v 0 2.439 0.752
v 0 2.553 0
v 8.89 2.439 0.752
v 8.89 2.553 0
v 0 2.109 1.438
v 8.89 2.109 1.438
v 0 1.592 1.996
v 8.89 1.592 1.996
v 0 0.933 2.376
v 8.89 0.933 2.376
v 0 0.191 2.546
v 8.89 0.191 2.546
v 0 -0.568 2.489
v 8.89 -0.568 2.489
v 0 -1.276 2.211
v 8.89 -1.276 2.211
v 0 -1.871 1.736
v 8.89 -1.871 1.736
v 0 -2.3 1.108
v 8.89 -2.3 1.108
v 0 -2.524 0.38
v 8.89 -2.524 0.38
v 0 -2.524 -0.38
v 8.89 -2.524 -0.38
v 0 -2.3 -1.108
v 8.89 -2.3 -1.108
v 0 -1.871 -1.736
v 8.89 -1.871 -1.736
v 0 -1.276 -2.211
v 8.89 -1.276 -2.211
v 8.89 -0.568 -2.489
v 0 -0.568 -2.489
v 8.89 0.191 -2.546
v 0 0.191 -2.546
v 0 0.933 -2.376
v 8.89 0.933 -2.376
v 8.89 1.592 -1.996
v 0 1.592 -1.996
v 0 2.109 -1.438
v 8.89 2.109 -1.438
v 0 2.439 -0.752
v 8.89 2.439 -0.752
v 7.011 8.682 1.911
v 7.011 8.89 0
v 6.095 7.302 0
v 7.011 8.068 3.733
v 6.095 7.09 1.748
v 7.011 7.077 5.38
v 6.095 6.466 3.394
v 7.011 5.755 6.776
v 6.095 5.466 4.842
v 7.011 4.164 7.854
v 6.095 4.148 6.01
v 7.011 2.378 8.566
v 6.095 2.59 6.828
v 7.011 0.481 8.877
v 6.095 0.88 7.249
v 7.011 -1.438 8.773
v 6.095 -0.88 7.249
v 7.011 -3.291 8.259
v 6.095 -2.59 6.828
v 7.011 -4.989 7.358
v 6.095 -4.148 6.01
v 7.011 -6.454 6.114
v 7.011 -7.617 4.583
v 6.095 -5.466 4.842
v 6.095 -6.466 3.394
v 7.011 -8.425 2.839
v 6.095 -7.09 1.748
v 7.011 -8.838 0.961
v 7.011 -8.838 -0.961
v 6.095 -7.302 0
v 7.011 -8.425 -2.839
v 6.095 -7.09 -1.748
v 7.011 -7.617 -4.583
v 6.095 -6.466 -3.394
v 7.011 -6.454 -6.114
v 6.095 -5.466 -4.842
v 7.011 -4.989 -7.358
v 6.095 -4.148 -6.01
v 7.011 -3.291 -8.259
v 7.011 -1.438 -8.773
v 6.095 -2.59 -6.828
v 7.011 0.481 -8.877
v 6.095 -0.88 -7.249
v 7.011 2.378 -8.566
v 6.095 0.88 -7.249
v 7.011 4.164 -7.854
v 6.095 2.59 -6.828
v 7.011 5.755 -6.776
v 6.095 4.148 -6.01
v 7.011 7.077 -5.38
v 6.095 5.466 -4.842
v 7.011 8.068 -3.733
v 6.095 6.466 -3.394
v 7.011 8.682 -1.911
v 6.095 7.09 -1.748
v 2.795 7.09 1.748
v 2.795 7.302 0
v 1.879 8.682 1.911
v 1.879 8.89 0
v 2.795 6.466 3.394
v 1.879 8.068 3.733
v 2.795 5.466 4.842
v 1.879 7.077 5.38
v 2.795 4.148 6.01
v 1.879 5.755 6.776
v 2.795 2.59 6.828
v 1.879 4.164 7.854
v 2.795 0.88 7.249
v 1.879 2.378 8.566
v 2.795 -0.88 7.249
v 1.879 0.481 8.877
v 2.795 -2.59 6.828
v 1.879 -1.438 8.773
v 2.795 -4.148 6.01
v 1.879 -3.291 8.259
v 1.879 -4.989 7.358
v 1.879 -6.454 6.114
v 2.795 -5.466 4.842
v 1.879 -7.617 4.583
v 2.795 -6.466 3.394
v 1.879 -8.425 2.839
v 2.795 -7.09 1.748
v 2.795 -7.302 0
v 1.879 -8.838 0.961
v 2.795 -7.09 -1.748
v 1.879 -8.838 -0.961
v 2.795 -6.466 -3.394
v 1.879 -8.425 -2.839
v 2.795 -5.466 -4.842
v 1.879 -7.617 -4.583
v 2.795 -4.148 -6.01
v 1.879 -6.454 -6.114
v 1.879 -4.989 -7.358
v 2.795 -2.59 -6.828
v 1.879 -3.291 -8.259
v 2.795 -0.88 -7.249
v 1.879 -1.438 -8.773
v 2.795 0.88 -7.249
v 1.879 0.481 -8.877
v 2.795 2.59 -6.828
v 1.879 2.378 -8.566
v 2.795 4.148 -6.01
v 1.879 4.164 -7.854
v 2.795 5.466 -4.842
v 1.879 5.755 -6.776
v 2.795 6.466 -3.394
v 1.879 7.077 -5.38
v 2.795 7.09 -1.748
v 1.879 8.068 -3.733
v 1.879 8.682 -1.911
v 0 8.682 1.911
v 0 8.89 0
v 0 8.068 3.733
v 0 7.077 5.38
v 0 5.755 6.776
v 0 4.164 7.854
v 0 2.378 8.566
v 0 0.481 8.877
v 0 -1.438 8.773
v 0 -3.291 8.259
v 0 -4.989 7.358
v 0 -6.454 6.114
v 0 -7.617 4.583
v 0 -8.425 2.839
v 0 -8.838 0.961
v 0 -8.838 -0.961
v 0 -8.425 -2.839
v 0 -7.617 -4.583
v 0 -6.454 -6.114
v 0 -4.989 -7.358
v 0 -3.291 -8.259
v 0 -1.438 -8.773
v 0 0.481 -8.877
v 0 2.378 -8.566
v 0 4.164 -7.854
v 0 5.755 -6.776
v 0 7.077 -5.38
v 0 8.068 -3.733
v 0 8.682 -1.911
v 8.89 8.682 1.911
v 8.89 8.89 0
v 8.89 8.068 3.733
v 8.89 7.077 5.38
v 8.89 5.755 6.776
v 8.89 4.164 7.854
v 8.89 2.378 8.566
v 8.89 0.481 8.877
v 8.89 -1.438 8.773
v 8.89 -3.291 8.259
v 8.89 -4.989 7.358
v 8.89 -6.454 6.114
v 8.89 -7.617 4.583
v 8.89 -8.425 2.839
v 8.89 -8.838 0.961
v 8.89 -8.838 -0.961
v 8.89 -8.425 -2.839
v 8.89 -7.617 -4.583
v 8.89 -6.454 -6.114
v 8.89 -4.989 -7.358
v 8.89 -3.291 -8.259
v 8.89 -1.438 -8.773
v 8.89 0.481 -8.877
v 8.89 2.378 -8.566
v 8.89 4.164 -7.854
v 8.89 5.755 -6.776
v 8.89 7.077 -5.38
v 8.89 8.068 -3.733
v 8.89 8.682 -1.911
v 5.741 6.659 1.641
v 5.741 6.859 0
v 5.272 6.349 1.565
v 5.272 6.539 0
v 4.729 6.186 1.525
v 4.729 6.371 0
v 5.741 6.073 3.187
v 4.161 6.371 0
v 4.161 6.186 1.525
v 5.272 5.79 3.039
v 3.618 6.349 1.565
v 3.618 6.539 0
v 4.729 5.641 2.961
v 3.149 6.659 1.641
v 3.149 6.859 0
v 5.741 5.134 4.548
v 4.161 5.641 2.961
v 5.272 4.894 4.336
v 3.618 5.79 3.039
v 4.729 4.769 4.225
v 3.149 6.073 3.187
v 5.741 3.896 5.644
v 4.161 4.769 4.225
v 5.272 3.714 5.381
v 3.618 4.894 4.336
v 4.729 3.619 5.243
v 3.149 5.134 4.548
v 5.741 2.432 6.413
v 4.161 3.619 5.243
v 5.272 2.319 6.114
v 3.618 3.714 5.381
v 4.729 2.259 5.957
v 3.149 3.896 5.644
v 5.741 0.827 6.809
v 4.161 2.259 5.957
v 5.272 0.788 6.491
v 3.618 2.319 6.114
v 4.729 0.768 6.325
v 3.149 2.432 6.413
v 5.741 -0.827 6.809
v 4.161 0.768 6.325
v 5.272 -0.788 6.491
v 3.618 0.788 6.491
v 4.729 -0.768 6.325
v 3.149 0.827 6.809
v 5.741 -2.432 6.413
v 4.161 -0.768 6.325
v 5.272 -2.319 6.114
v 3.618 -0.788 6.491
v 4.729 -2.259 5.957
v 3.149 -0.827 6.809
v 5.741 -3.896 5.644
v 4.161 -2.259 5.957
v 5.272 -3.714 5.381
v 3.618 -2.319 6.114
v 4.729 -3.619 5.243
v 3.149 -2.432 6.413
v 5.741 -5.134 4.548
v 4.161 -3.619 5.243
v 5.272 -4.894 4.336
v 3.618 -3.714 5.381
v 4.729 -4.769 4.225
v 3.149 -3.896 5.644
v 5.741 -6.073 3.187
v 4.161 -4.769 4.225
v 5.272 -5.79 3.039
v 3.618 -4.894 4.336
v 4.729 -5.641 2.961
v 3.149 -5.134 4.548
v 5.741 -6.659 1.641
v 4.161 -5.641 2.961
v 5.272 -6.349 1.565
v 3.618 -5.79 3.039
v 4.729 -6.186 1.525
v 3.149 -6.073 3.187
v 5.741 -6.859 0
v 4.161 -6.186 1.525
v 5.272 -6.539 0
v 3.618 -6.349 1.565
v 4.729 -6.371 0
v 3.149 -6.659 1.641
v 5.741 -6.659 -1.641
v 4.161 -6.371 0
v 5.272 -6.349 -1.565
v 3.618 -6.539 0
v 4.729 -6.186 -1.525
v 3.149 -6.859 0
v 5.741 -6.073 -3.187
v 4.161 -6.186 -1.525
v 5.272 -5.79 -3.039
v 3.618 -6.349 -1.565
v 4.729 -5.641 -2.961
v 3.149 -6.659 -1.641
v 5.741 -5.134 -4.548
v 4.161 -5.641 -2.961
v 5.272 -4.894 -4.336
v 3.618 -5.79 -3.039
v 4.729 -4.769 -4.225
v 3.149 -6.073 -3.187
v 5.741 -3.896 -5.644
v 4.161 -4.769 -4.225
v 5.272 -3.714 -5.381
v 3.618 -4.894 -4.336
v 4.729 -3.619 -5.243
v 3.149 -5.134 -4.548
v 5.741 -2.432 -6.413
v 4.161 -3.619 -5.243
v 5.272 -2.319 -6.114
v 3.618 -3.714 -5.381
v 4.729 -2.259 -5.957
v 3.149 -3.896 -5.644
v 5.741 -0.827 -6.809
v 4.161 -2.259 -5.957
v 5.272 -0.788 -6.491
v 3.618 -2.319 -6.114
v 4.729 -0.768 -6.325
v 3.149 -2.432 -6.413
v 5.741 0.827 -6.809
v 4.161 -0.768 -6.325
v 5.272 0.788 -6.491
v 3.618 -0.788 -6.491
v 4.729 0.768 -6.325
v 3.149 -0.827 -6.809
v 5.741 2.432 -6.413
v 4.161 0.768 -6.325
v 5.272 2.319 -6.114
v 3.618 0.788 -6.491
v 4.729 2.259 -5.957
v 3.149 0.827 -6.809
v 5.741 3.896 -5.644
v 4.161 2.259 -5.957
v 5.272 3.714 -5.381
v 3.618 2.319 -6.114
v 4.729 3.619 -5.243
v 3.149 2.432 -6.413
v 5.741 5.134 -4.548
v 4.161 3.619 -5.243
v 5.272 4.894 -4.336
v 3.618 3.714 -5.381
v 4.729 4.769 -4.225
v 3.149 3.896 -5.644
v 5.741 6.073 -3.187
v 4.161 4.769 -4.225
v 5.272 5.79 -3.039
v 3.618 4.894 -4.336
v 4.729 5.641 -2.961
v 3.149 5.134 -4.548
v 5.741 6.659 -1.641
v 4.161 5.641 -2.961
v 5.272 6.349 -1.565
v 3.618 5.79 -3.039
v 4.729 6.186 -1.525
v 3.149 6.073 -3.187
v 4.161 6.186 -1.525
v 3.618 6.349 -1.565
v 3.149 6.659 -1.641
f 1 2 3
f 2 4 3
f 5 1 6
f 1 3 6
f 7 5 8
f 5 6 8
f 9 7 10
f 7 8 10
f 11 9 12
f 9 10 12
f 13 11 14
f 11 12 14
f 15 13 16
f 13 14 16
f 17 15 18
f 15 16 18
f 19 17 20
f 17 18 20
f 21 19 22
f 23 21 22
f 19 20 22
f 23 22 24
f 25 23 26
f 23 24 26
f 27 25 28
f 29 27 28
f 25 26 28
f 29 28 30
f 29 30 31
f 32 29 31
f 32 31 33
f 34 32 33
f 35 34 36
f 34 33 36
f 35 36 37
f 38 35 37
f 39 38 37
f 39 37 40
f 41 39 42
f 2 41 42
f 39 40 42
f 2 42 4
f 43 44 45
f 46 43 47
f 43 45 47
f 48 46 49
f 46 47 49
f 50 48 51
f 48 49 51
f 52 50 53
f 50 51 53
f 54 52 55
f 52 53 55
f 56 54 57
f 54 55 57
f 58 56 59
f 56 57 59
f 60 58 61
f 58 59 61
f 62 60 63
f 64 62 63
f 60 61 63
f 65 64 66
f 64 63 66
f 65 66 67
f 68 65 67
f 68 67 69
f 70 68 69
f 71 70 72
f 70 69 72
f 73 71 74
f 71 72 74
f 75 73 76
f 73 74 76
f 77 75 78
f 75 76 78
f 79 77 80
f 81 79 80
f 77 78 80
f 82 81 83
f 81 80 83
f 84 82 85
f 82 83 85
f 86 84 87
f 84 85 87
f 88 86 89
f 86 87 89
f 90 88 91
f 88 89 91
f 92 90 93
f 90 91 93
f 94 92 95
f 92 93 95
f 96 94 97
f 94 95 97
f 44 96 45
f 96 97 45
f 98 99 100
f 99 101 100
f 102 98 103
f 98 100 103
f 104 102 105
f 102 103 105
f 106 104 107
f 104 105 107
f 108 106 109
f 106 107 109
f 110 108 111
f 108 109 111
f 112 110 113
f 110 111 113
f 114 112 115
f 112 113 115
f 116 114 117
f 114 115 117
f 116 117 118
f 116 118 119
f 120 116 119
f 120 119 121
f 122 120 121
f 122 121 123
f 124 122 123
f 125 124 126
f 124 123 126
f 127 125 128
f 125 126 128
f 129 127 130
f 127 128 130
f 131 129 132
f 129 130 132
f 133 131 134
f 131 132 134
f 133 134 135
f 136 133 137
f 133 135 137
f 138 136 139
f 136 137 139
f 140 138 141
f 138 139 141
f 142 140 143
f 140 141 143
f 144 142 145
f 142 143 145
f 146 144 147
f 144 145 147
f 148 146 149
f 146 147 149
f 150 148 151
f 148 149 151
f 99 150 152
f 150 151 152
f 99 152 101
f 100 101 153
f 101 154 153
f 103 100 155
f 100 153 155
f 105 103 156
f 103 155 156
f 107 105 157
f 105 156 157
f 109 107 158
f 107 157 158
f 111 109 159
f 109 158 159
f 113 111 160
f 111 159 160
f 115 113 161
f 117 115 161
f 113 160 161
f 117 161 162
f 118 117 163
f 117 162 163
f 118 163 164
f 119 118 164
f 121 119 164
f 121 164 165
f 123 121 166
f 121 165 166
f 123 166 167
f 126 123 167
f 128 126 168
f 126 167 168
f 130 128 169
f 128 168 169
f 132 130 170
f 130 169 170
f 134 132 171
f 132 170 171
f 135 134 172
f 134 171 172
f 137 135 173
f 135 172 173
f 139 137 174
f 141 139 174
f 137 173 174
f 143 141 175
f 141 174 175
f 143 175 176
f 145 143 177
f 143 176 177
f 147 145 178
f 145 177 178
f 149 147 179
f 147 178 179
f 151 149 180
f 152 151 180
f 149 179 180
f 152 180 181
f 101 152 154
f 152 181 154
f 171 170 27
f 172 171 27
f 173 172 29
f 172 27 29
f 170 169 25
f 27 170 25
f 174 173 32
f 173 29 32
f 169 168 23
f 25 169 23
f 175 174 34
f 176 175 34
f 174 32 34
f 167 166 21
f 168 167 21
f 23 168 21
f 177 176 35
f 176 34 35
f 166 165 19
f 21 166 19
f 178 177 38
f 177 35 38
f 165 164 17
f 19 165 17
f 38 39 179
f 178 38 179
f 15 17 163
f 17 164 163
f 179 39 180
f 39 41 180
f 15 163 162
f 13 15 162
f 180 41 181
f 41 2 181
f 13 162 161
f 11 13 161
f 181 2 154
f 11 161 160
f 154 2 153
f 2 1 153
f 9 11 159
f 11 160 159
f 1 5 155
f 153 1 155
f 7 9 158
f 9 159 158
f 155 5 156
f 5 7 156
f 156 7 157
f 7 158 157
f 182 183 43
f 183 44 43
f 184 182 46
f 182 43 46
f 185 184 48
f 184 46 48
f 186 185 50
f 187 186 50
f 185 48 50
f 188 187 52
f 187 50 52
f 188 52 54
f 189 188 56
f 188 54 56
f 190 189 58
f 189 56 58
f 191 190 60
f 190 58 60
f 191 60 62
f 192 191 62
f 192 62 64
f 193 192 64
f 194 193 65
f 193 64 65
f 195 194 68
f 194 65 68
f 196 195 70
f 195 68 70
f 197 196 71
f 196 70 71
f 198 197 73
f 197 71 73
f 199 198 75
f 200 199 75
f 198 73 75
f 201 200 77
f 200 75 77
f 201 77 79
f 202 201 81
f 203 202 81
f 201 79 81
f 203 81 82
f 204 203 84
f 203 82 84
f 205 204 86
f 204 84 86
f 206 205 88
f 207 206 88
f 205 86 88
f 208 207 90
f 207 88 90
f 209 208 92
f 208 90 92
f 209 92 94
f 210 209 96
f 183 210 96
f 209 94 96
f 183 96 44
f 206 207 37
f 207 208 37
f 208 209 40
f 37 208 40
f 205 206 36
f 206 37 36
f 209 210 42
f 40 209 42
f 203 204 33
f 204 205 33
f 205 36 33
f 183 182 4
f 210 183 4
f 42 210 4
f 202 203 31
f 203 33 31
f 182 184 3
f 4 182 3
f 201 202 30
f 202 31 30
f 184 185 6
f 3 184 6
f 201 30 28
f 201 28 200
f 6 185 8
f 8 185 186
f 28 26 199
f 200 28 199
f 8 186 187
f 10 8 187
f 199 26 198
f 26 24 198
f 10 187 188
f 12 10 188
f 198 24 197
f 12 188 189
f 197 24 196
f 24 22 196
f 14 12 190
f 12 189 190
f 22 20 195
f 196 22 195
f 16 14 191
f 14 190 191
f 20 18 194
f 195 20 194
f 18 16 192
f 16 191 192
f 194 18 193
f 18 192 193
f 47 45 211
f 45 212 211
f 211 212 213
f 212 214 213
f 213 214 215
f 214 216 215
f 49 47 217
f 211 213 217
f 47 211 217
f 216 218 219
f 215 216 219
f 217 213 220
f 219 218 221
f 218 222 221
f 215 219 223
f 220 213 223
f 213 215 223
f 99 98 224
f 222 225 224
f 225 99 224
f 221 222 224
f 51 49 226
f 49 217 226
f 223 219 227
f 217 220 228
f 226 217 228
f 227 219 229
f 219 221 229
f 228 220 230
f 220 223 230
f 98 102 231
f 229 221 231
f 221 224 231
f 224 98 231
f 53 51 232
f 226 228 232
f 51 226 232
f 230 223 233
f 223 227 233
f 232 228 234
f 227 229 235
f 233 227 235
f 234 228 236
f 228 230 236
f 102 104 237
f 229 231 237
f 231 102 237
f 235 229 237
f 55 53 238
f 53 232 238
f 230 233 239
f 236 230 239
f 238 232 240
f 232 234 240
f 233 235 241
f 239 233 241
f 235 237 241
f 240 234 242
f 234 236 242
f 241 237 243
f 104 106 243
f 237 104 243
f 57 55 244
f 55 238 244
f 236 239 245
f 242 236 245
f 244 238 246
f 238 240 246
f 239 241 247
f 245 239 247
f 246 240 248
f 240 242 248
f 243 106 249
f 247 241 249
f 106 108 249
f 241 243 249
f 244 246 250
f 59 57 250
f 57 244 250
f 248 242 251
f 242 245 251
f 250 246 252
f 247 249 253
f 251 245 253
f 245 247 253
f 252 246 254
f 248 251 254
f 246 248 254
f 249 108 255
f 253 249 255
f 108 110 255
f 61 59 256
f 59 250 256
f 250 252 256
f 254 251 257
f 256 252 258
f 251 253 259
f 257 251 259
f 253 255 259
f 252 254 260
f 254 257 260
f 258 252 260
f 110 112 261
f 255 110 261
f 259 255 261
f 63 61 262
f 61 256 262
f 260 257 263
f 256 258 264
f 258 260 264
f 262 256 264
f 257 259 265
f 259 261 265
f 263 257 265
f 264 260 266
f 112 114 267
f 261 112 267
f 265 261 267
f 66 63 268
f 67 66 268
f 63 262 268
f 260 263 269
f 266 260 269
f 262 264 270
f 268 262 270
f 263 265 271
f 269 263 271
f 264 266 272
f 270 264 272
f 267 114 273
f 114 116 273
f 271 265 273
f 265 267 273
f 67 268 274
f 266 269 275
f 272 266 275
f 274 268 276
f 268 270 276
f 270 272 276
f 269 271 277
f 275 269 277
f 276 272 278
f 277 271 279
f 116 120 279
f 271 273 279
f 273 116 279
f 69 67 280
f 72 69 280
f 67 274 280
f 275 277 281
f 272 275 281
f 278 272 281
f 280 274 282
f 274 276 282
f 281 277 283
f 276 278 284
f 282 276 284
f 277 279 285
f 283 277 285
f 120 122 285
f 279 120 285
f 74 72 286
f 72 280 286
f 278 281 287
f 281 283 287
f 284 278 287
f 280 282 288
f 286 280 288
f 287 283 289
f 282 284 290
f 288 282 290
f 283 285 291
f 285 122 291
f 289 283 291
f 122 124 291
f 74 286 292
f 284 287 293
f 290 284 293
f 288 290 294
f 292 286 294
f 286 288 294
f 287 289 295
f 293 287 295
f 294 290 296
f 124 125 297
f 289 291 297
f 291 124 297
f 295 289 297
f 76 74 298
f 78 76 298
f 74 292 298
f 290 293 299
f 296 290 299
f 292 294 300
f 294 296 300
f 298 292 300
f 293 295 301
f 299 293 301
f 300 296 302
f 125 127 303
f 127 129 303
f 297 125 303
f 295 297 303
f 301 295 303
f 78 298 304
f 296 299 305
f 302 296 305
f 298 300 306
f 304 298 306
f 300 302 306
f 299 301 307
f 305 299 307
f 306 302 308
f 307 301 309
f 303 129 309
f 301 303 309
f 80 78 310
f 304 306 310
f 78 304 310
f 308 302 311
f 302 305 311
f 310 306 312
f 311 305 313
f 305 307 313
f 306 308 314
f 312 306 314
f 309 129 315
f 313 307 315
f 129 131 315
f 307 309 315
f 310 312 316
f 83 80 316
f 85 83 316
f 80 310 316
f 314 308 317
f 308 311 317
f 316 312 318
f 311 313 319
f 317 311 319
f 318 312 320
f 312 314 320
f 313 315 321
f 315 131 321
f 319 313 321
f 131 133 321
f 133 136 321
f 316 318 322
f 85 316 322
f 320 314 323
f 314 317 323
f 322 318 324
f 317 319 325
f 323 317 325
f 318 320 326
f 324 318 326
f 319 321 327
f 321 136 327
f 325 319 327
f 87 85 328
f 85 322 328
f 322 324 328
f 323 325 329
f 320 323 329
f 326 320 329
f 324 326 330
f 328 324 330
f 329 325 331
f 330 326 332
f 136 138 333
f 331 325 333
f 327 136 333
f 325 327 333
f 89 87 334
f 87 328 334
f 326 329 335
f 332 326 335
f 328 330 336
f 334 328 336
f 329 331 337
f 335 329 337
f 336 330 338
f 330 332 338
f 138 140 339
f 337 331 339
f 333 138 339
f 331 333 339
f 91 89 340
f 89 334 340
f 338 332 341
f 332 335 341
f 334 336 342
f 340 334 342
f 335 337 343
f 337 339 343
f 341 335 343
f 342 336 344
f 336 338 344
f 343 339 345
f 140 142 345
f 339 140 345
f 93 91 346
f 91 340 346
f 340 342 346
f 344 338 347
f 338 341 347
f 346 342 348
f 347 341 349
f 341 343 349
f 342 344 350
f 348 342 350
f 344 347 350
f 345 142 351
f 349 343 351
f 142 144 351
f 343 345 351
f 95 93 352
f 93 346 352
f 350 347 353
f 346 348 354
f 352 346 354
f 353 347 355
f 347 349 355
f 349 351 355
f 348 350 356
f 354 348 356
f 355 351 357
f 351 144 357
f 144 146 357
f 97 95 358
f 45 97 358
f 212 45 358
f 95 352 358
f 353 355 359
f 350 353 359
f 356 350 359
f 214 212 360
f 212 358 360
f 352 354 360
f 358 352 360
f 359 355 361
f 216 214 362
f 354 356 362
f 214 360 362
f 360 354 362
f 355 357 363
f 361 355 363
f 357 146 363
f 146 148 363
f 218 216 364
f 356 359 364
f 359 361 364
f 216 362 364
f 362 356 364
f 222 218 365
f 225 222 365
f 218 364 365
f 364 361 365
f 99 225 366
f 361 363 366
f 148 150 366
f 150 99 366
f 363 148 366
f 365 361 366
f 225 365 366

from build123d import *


with BuildPart() as part:
    # Sketch1 → Revolve1 (revolve)
    with BuildSketch(Plane.XY):
        with BuildLine():
            Line((0, 2.5527), (8.89, 2.5527))
            Line((8.89, 2.5527), (8.89, 8.89))
            Line((8.89, 8.89), (7.011321947, 8.89))
            Line((7.011321947, 8.89), (6.094778394, 7.3025))
            ThreePointArc((6.094778394, 7.3025), (4.445, 6.35), (2.795221606, 7.3025))
            Line((2.795221606, 7.3025), (1.878678053, 8.89))
            Line((1.878678053, 8.89), (0, 8.89))
            Line((0, 8.89), (0, 2.5527))
        make_face()
    revolve(axis=Axis((0, 0, 0), (1, 0, 0)))


solid = part.part
